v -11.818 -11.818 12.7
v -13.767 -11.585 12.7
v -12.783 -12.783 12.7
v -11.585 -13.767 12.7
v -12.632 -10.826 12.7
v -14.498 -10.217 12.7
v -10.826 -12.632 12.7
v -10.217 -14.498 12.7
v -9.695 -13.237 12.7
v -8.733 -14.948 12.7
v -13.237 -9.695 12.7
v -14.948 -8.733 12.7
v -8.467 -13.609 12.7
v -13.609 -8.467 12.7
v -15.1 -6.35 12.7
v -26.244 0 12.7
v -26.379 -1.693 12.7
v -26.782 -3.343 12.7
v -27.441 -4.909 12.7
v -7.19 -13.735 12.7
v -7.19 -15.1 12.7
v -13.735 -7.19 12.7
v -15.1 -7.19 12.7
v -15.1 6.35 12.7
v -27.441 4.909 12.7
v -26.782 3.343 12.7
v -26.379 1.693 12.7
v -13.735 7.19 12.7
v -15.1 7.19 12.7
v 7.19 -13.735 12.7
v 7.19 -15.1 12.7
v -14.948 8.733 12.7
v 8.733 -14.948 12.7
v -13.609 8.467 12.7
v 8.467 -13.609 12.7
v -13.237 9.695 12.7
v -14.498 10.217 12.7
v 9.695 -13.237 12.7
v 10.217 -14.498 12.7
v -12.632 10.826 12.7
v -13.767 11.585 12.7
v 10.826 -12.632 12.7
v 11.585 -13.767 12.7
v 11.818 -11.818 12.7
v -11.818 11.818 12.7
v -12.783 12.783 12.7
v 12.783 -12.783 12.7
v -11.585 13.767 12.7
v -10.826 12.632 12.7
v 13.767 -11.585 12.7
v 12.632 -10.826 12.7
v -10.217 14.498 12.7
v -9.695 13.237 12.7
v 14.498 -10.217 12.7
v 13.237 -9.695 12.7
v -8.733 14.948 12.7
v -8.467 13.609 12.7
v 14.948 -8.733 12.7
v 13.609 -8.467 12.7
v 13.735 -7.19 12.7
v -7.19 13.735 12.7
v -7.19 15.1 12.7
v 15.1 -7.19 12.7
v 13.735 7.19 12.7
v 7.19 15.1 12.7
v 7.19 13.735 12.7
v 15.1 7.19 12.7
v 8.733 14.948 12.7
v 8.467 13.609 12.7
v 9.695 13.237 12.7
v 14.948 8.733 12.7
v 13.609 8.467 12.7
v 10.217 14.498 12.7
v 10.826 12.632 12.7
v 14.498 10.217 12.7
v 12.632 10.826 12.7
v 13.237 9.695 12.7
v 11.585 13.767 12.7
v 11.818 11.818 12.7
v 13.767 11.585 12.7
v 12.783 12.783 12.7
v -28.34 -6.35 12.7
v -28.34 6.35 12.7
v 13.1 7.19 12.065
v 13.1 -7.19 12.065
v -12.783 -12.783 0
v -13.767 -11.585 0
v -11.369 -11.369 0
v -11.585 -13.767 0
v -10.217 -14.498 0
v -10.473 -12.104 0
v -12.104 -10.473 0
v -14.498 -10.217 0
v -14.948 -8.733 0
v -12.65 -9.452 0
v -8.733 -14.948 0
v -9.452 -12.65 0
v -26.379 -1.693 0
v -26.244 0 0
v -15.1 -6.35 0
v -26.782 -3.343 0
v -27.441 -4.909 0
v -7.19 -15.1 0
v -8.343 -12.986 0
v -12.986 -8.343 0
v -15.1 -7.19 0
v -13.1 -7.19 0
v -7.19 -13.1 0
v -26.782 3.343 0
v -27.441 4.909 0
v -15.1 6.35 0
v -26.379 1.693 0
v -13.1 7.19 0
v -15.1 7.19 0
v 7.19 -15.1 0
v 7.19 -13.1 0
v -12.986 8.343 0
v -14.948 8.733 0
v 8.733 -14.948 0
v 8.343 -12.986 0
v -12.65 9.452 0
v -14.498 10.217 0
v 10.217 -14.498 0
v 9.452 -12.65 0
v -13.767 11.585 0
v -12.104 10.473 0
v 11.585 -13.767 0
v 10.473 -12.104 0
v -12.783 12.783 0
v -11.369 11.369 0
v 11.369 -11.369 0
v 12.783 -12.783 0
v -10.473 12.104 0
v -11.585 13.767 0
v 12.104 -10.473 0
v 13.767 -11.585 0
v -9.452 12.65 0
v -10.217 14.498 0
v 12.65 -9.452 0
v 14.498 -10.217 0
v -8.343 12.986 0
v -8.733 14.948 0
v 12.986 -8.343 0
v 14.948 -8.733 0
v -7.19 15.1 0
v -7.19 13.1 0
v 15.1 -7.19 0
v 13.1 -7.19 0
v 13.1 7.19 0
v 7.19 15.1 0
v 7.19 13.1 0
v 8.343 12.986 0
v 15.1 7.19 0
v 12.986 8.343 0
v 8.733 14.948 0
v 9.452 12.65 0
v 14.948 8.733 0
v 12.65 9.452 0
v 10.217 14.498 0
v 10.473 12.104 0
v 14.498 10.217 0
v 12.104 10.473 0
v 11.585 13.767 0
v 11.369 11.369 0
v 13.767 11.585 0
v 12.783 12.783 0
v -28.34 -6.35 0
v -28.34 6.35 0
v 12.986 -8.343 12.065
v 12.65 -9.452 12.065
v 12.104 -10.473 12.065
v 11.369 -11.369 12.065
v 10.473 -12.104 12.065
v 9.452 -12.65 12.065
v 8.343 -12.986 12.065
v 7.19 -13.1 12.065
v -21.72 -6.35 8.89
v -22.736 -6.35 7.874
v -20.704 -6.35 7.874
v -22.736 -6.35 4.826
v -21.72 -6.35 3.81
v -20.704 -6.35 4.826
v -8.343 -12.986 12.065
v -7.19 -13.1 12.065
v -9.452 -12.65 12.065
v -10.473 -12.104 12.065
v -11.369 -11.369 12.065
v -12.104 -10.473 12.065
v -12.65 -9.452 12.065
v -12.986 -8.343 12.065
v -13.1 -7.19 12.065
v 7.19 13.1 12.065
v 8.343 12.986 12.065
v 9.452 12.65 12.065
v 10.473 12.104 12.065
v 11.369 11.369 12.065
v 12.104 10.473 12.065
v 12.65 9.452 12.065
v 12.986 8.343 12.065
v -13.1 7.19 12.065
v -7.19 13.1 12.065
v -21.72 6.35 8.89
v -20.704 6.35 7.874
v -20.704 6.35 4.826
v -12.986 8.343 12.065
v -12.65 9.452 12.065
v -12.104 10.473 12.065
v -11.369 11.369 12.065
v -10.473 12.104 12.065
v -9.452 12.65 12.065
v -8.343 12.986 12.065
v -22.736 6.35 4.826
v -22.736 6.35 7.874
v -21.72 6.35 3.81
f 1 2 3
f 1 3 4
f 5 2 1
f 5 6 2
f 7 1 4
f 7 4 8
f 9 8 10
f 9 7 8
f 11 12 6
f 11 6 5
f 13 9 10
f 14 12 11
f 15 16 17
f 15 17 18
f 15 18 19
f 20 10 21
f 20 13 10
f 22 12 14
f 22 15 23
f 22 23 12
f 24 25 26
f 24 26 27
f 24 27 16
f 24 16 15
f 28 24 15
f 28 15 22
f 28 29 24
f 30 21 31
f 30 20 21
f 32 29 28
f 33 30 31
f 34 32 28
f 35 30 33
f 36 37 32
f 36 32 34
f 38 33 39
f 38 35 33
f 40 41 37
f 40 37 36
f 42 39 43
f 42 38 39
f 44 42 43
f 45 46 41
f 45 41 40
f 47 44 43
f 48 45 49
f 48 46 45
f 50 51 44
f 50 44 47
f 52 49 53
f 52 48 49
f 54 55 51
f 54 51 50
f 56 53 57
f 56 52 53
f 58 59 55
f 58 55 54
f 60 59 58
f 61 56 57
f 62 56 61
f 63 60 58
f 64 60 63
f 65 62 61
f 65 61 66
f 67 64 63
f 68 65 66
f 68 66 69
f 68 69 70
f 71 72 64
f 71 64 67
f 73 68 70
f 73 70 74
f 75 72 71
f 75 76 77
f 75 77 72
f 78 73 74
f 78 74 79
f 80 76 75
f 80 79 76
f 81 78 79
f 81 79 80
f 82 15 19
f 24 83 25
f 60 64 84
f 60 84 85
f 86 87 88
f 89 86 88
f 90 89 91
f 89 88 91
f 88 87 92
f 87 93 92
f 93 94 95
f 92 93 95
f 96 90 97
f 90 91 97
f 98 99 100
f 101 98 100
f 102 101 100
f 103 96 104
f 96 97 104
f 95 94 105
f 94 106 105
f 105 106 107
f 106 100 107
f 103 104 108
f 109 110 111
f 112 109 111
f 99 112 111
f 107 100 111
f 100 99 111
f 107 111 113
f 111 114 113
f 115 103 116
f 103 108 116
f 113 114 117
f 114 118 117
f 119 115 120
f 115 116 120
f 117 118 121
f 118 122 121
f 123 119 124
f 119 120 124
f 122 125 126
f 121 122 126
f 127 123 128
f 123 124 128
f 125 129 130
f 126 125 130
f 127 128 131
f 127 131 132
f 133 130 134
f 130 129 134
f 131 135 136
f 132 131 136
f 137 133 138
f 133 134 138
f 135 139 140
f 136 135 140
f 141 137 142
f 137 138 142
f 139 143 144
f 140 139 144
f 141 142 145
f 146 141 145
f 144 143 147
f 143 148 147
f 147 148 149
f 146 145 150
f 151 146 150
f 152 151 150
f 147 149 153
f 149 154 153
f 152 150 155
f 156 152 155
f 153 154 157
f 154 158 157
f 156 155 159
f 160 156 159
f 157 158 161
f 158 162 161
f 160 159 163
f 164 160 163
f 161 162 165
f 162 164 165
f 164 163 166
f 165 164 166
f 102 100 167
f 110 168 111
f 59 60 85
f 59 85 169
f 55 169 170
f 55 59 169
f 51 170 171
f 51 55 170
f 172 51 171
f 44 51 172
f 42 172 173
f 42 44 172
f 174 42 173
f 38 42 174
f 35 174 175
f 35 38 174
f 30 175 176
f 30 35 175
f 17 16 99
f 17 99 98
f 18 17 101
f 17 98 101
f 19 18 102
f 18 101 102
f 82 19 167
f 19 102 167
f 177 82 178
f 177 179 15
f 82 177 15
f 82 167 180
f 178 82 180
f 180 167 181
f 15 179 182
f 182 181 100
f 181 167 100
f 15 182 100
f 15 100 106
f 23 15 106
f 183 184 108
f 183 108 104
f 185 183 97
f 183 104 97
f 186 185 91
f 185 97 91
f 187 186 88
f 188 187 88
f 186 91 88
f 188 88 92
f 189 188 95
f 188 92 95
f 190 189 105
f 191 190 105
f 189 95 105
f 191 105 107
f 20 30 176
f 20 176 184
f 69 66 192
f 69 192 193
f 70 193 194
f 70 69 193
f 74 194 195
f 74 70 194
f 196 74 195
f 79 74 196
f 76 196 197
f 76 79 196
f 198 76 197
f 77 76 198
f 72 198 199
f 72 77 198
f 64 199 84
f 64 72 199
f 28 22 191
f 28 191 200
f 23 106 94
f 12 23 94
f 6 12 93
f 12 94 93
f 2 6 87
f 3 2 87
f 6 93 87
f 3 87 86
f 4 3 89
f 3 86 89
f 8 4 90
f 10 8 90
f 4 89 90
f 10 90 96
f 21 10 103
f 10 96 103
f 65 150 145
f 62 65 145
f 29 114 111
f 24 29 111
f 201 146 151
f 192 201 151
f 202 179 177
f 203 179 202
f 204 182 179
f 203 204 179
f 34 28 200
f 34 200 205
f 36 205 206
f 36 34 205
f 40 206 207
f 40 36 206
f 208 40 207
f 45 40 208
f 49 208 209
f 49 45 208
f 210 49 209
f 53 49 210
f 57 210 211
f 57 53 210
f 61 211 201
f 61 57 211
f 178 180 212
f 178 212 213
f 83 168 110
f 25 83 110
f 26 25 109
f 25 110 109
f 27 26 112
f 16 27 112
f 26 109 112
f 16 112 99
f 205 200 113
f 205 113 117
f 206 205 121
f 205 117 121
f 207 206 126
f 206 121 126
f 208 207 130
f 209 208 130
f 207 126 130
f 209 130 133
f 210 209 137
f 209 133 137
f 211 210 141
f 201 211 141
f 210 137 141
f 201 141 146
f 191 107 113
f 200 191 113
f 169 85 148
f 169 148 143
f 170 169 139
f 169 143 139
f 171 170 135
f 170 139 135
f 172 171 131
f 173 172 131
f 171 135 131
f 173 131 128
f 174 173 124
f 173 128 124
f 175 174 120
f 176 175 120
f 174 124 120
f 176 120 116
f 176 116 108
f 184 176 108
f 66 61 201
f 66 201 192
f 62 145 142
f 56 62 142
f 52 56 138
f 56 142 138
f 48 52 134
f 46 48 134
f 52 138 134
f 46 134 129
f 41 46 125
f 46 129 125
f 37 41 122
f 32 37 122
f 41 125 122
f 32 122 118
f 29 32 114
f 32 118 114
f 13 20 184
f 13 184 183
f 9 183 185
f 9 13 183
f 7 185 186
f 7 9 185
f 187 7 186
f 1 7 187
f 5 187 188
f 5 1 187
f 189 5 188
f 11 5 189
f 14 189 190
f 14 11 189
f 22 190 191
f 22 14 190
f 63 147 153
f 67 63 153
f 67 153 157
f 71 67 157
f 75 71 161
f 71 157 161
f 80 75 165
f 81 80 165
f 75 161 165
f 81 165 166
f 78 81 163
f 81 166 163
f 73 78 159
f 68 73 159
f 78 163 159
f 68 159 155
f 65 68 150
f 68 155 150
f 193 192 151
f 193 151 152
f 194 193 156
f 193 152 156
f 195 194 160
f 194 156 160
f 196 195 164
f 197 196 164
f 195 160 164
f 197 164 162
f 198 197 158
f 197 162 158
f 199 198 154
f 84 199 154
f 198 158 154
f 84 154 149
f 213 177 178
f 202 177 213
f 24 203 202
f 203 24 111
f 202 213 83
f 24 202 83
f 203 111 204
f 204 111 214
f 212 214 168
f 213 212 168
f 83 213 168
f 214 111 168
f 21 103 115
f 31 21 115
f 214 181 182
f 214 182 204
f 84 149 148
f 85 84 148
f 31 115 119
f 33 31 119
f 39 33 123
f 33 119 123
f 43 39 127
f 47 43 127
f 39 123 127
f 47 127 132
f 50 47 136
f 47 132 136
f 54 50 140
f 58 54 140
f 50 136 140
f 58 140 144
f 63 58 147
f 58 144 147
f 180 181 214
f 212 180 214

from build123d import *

# Parameters (mm, degrees)
F0_W     = 2
F0_H     = 12.7
F1_DEPTH = 12.7
F2_SIZE  = 0.635
F3_W     = 2.032
F3_H     = 5.08
F4_DEPTH = 25.4
F5_SIZE  = 1.01599


# Not quite as in the source:
# - a fillet or chamfer is up to 0.001 mm smaller than in the source, because OpenCascade refuses the exact size


with BuildPart() as f1:
    # F0 (on Top) → F1 (new body)
    with BuildSketch(Plane.XY):
        with BuildLine():
            Line((-15.1, -6.35), (-15.1, 6.35))
            Line((-15.1, 6.35), (-28.34, 6.35))
            ThreePointArc((-28.34, 6.35), (-26.7817380481, 3.3434490418), (-26.2442648116, 0))
            ThreePointArc((-26.2442648116, 0), (-26.7817380481, -3.3434490418), (-28.34, -6.35))
            Line((-28.34, -6.35), (-15.1, -6.35))
        make_face()
        with Locations((-14.1, 0)):
            Rectangle(F0_W, F0_H)
        with BuildLine():
            ThreePointArc((7.19, 13.1), (11.3690010768, 11.3690010768), (13.1, 7.19))
            Line((13.1, 7.19), (13.1, -7.19))
            ThreePointArc((13.1, -7.19), (11.3690010768, -11.3690010768), (7.19, -13.1))
            Line((7.19, -13.1), (-7.19, -13.1))
            ThreePointArc((-7.19, -13.1), (-11.3690010768, -11.3690010768), (-13.1, -7.19))
            Line((-13.1, -7.19), (-13.1, -6.35))
            Line((-13.1, -6.35), (-15.1, -6.35))
            Line((-15.1, -6.35), (-15.1, -7.19))
            ThreePointArc((-15.1, -7.19), (-12.7832146392, -12.7832146392), (-7.19, -15.1))
            Line((-7.19, -15.1), (7.19, -15.1))
            ThreePointArc((7.19, -15.1), (12.7832146392, -12.7832146392), (15.1, -7.19))
            Line((15.1, -7.19), (15.1, 7.19))
            ThreePointArc((15.1, 7.19), (12.7832146392, 12.7832146392), (7.19, 15.1))
            Line((7.19, 15.1), (-7.19, 15.1))
            ThreePointArc((-7.19, 15.1), (-12.7832146392, 12.7832146392), (-15.1, 7.19))
            Line((-15.1, 7.19), (-15.1, 6.35))
            Line((-15.1, 6.35), (-13.1, 6.35))
            Line((-13.1, 6.35), (-13.1, 7.19))
            ThreePointArc((-13.1, 7.19), (-11.3690010768, 11.3690010768), (-7.19, 13.1))
            Line((-7.19, 13.1), (7.19, 13.1))
        make_face()
    extrude(amount=F1_DEPTH)

    # F2
    f2_edges = [f1.edges().sort_by_distance(p)[0] for p in [
        (-11.369001, 11.369001, 12.7),
        (0, 13.1, 12.7),
        (11.369001, 11.369001, 12.7),
        (13.1, 0, 12.7),
        (11.369001, -11.369001, 12.7),
        (0, -13.1, 12.7),
        (-11.369001, -11.369001, 12.7),
        (-13.1, 0, 12.7),
    ]]
    chamfer(f2_edges, length=F2_SIZE)

    # F3 (on face) → F4 (cut)
    with BuildSketch(Plane.XZ.offset(6.35)):
        with Locations((-21.72, 6.35)):
            Rectangle(F3_W, F3_H)
    extrude(amount=-F4_DEPTH, mode=Mode.SUBTRACT)

    # F5 (size 1.016 in the source; OpenCascade refuses exactly that, so slightly less here)
    f5_edges = [f1.edges().sort_by_distance(p)[0] for p in [
        (-22.736, 0, 3.81),
        (-20.704, 0, 3.81),
        (-20.704, 0, 8.89),
        (-22.736, 0, 8.89),
    ]]
    chamfer(f5_edges, length=F5_SIZE)


solid = f1.part
